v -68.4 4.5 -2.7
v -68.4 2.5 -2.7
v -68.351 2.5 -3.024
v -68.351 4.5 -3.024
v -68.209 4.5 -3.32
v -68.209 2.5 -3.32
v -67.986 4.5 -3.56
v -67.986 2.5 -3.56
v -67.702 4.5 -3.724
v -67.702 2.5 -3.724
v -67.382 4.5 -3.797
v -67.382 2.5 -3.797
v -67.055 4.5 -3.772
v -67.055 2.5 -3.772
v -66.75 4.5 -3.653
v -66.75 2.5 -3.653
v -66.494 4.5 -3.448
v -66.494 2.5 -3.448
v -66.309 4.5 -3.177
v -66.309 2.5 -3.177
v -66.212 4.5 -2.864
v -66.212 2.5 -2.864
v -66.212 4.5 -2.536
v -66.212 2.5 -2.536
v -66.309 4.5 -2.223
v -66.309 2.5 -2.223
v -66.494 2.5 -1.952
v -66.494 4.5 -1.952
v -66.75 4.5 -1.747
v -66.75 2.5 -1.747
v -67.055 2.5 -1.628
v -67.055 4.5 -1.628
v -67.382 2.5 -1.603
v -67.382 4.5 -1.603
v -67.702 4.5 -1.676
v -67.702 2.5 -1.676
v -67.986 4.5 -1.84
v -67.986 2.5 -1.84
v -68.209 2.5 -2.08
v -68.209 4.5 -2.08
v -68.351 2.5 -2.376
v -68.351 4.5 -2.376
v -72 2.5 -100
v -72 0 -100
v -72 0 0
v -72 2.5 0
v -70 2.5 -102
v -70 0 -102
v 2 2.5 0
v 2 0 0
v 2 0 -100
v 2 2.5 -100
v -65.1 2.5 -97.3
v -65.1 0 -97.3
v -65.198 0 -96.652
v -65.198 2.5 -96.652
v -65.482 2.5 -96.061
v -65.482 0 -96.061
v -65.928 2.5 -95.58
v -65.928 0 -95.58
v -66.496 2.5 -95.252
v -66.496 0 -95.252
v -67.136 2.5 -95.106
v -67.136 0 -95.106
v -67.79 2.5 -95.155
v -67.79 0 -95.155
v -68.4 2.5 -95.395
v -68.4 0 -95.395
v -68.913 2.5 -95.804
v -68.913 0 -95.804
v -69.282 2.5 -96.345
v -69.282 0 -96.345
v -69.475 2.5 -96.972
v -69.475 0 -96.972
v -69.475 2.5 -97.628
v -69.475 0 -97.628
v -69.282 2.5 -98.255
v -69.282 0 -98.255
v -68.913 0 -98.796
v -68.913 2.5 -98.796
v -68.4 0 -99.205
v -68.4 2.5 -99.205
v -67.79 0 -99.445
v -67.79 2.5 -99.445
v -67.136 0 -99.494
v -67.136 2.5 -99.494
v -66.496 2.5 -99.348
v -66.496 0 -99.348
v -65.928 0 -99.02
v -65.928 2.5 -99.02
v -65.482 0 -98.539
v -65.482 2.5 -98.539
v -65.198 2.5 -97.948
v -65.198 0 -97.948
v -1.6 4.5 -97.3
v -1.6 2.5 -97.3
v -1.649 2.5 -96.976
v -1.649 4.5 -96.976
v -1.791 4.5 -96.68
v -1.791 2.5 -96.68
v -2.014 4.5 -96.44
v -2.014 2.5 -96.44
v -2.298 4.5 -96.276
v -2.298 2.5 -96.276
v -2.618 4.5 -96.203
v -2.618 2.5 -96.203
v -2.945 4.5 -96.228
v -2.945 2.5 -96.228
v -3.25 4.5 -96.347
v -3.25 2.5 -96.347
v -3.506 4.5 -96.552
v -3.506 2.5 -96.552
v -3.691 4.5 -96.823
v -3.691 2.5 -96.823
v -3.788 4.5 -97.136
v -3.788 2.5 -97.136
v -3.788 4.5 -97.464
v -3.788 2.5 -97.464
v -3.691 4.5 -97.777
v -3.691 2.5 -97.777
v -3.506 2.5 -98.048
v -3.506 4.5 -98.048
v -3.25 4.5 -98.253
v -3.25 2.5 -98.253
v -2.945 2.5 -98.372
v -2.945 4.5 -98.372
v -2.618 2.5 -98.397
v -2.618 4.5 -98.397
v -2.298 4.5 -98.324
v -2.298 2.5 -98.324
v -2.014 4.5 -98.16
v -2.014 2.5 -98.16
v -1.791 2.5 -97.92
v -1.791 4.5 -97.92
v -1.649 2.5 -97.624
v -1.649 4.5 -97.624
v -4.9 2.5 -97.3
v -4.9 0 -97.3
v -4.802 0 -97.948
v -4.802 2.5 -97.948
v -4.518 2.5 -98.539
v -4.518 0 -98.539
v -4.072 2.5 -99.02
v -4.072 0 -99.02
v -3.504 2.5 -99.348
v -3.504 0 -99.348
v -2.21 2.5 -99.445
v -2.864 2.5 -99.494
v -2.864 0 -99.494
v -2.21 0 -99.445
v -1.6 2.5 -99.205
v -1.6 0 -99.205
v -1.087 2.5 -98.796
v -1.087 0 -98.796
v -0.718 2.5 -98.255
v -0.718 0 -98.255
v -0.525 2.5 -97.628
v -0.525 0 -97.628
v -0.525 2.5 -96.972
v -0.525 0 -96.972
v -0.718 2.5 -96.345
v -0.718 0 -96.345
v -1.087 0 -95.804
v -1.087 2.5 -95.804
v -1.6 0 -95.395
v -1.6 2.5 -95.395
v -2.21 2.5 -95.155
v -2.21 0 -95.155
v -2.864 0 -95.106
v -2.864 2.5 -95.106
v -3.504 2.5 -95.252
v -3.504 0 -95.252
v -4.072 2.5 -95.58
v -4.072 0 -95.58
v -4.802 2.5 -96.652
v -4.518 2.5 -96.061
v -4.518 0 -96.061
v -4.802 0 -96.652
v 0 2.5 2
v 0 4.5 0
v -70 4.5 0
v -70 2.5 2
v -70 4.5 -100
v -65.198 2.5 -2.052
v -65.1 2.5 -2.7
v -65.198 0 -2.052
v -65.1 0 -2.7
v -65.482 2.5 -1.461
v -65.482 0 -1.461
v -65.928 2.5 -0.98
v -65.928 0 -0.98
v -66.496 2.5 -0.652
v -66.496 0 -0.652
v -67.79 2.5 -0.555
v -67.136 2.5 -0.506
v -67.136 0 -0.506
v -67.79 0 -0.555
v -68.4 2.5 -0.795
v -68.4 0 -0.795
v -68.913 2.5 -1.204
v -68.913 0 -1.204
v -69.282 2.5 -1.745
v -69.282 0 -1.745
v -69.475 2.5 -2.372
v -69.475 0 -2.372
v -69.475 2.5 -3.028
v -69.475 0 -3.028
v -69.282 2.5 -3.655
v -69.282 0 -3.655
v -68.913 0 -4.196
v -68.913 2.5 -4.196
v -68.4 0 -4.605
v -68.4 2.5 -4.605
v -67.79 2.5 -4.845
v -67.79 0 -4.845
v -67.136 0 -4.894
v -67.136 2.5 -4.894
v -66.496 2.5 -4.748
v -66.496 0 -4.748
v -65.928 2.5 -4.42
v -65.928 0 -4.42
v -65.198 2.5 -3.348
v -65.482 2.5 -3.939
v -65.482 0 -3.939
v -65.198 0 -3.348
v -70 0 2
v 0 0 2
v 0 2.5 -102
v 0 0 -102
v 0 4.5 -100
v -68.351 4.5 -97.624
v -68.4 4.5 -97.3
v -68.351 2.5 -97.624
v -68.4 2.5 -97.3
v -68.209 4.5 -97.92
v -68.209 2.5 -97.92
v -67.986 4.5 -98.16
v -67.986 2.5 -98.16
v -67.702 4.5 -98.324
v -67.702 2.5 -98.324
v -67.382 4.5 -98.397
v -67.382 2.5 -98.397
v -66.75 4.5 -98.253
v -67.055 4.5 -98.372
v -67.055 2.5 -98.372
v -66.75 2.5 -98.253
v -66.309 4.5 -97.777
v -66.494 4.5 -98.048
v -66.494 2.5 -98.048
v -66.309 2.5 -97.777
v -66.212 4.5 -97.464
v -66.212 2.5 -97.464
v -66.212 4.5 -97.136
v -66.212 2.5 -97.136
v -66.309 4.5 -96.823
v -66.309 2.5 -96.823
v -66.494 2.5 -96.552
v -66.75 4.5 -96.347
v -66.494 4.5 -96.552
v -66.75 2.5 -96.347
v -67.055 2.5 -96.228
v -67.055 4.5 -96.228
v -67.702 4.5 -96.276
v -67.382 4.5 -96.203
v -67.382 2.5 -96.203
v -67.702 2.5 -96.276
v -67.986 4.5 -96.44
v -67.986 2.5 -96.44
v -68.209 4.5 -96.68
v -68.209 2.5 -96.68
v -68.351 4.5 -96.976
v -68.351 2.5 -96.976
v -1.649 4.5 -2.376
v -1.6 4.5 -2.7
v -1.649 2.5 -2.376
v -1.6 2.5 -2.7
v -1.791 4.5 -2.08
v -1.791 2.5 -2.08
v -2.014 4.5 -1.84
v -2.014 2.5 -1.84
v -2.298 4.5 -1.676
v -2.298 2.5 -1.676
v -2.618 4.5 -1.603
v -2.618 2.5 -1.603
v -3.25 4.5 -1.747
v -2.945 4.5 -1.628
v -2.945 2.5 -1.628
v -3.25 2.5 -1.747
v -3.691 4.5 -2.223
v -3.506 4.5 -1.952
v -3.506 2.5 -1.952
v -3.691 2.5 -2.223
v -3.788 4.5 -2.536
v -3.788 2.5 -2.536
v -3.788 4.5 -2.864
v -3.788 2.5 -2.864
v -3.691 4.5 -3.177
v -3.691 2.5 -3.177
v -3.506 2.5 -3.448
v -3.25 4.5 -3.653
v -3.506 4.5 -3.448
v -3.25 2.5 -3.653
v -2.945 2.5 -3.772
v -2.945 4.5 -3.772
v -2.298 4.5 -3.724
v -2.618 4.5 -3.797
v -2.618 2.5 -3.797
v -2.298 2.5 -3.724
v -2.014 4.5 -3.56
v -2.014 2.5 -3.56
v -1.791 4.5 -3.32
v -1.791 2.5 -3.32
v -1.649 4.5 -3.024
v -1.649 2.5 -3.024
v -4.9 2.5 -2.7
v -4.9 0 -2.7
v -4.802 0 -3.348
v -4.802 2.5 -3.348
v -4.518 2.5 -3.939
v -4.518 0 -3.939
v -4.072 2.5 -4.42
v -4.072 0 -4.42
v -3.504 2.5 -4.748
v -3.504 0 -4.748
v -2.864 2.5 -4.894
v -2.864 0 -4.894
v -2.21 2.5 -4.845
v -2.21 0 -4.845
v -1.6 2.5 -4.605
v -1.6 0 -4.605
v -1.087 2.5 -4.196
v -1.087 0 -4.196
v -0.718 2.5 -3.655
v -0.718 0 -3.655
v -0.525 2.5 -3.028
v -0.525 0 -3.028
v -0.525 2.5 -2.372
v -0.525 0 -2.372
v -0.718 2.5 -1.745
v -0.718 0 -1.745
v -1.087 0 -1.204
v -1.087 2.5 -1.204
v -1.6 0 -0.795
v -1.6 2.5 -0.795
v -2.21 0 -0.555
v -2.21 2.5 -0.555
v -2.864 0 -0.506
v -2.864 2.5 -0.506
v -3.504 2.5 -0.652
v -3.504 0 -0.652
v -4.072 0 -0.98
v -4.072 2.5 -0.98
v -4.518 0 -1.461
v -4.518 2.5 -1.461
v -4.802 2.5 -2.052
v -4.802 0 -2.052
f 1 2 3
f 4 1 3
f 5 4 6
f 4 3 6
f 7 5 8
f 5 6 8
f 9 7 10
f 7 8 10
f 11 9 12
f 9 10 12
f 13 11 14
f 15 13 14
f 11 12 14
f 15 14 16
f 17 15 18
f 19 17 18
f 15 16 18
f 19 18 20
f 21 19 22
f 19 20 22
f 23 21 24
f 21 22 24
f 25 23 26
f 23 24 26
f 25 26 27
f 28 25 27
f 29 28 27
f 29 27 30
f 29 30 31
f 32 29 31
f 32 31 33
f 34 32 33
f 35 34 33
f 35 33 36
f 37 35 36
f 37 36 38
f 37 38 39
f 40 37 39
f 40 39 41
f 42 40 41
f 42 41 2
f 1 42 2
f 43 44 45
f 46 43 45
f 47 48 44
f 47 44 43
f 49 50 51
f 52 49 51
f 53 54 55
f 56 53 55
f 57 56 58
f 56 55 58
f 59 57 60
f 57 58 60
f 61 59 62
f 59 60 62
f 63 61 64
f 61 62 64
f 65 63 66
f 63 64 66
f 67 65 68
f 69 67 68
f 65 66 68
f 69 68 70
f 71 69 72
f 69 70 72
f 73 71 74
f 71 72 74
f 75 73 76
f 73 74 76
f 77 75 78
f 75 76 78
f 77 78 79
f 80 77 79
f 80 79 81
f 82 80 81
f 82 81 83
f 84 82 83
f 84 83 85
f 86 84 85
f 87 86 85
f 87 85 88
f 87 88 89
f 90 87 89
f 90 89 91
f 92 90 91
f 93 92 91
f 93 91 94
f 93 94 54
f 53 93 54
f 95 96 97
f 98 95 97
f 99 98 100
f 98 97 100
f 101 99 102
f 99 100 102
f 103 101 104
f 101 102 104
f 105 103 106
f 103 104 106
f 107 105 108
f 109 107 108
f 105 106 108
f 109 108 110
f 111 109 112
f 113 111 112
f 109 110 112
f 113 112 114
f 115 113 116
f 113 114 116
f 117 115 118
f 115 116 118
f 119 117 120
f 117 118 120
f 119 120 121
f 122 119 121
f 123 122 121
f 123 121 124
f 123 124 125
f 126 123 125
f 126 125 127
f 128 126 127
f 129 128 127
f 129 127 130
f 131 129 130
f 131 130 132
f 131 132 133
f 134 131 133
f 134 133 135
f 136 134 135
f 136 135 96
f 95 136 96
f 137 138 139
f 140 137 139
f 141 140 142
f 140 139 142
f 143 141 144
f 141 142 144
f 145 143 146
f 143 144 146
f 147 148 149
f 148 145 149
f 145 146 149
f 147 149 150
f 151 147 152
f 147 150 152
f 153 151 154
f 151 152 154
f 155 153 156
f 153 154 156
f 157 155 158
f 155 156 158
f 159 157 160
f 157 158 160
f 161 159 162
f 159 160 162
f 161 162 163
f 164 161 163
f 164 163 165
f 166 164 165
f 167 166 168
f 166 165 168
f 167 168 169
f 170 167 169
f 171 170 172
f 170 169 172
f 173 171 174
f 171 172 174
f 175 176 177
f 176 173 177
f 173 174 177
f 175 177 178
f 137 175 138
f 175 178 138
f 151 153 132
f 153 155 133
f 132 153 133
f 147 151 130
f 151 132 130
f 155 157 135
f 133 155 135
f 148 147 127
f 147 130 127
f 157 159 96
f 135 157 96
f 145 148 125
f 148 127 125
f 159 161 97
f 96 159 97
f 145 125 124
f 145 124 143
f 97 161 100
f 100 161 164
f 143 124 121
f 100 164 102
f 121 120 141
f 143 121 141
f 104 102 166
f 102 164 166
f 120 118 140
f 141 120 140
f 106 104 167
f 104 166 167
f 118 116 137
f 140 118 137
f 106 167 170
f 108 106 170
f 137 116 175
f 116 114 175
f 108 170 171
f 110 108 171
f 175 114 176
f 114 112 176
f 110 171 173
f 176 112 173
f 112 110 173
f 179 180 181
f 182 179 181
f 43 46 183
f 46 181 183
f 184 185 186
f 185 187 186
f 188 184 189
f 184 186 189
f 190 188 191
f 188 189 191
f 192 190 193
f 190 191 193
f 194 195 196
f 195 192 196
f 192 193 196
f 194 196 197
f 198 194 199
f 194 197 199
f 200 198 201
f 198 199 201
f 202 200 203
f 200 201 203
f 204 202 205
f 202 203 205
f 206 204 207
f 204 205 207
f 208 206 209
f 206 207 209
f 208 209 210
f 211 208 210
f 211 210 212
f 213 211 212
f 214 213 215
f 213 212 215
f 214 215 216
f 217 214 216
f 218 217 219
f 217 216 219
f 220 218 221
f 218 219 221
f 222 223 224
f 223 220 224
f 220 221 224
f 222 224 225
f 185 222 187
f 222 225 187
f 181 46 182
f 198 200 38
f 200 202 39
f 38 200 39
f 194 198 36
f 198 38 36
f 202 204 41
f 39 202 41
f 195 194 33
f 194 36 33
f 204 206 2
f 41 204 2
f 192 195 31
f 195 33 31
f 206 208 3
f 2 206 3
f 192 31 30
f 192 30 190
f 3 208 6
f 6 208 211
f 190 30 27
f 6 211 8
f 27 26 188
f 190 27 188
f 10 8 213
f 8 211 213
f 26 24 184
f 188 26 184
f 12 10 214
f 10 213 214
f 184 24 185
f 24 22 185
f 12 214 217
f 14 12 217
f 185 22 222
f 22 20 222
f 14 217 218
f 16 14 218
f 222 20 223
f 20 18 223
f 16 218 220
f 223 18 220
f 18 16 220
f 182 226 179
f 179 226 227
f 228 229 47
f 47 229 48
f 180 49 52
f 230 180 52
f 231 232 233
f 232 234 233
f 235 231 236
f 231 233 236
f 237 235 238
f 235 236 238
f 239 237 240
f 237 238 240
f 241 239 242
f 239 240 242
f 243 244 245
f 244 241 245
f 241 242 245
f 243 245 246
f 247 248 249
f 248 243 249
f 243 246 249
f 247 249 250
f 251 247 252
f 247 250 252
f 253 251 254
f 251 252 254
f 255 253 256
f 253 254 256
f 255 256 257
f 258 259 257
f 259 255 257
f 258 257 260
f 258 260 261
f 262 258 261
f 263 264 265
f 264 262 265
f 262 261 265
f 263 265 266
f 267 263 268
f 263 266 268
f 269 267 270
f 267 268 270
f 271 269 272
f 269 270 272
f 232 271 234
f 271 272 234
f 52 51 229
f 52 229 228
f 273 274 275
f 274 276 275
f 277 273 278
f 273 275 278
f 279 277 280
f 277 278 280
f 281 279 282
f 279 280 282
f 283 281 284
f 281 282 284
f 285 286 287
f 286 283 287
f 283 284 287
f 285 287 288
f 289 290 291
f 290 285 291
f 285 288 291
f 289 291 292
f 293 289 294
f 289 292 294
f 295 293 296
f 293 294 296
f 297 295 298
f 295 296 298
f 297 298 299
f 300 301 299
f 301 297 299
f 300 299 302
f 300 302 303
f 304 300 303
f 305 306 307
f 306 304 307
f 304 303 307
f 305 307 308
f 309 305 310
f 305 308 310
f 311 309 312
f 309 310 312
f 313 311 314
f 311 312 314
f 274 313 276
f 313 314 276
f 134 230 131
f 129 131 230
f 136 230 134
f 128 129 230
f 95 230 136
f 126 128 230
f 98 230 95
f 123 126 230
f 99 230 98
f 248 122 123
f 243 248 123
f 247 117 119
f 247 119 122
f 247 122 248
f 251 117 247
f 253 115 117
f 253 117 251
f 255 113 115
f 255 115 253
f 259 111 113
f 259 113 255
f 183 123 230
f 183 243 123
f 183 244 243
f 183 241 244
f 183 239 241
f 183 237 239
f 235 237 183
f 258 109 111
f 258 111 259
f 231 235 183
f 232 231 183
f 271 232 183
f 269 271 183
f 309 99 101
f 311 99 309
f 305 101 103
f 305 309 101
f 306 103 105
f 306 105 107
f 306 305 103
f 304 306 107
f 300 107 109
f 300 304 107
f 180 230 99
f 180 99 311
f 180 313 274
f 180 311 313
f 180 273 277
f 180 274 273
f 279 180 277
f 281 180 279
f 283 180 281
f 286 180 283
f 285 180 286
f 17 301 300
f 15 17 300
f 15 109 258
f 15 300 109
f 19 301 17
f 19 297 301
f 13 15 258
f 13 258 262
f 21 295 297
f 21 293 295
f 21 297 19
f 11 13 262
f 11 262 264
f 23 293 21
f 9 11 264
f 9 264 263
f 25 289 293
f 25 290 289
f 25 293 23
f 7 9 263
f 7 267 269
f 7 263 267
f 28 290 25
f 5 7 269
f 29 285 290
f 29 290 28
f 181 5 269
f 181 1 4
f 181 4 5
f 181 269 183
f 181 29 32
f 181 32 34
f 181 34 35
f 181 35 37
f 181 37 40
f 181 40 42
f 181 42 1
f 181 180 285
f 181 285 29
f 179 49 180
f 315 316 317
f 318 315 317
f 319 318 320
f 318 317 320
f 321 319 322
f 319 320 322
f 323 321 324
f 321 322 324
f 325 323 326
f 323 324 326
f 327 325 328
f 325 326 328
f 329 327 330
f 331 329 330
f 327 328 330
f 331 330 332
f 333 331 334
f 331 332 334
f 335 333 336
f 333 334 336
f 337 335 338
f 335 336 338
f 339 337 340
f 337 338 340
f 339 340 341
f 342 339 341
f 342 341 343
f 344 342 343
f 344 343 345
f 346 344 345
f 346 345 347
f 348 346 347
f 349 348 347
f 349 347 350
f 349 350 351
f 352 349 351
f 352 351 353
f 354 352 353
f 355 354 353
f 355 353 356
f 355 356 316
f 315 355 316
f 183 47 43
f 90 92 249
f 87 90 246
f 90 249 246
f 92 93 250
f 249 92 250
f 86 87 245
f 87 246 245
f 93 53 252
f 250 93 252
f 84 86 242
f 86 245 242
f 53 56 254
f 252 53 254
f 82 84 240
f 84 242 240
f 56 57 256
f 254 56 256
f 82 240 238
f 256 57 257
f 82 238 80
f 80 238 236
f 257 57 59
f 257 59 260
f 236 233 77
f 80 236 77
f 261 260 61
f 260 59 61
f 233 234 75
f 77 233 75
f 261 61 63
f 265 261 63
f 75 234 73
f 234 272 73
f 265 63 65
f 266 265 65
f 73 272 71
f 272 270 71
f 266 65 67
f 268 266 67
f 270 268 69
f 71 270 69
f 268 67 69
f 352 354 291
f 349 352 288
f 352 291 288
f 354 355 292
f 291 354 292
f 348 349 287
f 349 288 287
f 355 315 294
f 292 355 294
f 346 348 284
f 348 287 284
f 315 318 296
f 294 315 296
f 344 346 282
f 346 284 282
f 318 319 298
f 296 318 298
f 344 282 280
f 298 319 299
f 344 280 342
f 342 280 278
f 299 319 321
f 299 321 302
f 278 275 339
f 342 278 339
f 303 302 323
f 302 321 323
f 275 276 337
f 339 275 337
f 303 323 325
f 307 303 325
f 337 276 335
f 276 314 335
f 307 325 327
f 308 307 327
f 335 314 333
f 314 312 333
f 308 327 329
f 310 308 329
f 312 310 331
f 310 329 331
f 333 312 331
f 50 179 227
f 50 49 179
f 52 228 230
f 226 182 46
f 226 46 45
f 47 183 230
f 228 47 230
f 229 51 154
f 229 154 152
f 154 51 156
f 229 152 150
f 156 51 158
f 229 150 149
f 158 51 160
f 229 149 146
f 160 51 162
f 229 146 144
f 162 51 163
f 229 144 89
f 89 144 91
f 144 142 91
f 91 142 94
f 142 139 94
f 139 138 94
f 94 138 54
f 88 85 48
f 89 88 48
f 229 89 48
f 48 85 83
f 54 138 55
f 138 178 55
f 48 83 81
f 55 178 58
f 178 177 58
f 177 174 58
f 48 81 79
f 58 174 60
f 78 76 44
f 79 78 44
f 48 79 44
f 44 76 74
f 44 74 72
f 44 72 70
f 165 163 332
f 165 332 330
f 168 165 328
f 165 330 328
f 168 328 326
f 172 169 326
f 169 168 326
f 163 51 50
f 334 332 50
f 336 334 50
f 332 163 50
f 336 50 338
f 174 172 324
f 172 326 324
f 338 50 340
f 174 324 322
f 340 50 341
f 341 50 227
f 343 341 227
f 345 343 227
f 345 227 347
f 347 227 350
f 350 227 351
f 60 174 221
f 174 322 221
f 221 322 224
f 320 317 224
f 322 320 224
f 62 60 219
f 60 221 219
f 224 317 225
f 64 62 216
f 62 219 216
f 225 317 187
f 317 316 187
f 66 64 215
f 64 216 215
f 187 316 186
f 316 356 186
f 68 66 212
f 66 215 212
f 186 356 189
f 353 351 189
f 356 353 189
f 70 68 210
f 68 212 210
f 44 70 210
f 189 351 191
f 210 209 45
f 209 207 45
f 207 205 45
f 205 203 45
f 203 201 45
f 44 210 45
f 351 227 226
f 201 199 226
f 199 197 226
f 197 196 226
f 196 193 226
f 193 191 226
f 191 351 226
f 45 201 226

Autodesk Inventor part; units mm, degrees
ref_plane "YZ Plane" through (0, 0, 0) normal (1, 0, 0) x (0, 1, 0)
sketch "Sketch1" plane through (0, 0, 0) normal (0, 1, 0) x (-1, 0, 0)
  line L0 (0, 0) -> (70, 0) construction
  line L1 (70, 0) -> (70, -100) construction
  line L2 (70, -100) -> (0, -100) construction
  line L3 (0, -100) -> (0, 0) construction
  circle A0 centre (2.7, -97.3) radius 1.7 construction
  line L4 (0, -95.6) -> (4.4, -95.6) construction
  line L5 (4.4, -95.6) -> (4.4, -100) construction
  line L6 (72, 2) -> (-2, 2)
  line L7 (-2, 2) -> (-2, -102)
  line L8 (-2, -102) -> (72, -102)
  line L9 (72, -102) -> (72, 2)
  circle A1 centre (2.7, -97.3) radius 2.2
  dimension "d0" = 100
  dimension "d1" = 70
  dimension "d2" = 3.4
  dimension "d3" = 4.4
  dimension "d4" = 4.4
  dimension "d5" = 2
  dimension "d6" = 0.5
extrude "Extrusion3" add sketch "Sketch1" along normal blind 4.5 contours L9 L8 L7 L6 | A1
extrude "Extrusion4" cut sketch "Sketch1" along normal blind 2.5 contours A1
sketch "Sketch3" plane through (-2.7, 2.5, -97.3) normal (0, -1, 0) x (1, 0, 0)
  circle A0 centre (0, 0) radius 2.2 projected
  circle A1 centre (0, 0) radius 1.1
  point P0 (2.7, 97.3)
  dimension "d16" = 2.2
extrude "Extrusion5" cut sketch "Sketch3" against normal up to surface (2 mm away) contours A1
ref_plane "Work Plane3" through (2, 0, -50) normal (0, 0, -1) x (-1, 0, 0)
ref_plane "Work Plane4" through (-35, 0, -102) normal (-1, 0, 0) x (0, 0, 1)
mirror "Mirror1" about plane through (-35, 0, -102) normal (-1, 0, 0) of "Extrusion4", "Extrusion5"
mirror "Mirror2" about plane through (2, 0, -50) normal (0, 0, -1) of "Extrusion4", "Extrusion5", "Mirror1"
chamfer "Chamfer1" distance 2 angle 45 8 edges at (-72, 2.25, 2) (2, 2.25, 2) (-72, 2.25, -102) (2, 2.25, -102) (-35, 4.5, -102) (2, 4.5, -50) (-72, 4.5, -50) (-35, 4.5, 2)
properties part number "basePlate"
